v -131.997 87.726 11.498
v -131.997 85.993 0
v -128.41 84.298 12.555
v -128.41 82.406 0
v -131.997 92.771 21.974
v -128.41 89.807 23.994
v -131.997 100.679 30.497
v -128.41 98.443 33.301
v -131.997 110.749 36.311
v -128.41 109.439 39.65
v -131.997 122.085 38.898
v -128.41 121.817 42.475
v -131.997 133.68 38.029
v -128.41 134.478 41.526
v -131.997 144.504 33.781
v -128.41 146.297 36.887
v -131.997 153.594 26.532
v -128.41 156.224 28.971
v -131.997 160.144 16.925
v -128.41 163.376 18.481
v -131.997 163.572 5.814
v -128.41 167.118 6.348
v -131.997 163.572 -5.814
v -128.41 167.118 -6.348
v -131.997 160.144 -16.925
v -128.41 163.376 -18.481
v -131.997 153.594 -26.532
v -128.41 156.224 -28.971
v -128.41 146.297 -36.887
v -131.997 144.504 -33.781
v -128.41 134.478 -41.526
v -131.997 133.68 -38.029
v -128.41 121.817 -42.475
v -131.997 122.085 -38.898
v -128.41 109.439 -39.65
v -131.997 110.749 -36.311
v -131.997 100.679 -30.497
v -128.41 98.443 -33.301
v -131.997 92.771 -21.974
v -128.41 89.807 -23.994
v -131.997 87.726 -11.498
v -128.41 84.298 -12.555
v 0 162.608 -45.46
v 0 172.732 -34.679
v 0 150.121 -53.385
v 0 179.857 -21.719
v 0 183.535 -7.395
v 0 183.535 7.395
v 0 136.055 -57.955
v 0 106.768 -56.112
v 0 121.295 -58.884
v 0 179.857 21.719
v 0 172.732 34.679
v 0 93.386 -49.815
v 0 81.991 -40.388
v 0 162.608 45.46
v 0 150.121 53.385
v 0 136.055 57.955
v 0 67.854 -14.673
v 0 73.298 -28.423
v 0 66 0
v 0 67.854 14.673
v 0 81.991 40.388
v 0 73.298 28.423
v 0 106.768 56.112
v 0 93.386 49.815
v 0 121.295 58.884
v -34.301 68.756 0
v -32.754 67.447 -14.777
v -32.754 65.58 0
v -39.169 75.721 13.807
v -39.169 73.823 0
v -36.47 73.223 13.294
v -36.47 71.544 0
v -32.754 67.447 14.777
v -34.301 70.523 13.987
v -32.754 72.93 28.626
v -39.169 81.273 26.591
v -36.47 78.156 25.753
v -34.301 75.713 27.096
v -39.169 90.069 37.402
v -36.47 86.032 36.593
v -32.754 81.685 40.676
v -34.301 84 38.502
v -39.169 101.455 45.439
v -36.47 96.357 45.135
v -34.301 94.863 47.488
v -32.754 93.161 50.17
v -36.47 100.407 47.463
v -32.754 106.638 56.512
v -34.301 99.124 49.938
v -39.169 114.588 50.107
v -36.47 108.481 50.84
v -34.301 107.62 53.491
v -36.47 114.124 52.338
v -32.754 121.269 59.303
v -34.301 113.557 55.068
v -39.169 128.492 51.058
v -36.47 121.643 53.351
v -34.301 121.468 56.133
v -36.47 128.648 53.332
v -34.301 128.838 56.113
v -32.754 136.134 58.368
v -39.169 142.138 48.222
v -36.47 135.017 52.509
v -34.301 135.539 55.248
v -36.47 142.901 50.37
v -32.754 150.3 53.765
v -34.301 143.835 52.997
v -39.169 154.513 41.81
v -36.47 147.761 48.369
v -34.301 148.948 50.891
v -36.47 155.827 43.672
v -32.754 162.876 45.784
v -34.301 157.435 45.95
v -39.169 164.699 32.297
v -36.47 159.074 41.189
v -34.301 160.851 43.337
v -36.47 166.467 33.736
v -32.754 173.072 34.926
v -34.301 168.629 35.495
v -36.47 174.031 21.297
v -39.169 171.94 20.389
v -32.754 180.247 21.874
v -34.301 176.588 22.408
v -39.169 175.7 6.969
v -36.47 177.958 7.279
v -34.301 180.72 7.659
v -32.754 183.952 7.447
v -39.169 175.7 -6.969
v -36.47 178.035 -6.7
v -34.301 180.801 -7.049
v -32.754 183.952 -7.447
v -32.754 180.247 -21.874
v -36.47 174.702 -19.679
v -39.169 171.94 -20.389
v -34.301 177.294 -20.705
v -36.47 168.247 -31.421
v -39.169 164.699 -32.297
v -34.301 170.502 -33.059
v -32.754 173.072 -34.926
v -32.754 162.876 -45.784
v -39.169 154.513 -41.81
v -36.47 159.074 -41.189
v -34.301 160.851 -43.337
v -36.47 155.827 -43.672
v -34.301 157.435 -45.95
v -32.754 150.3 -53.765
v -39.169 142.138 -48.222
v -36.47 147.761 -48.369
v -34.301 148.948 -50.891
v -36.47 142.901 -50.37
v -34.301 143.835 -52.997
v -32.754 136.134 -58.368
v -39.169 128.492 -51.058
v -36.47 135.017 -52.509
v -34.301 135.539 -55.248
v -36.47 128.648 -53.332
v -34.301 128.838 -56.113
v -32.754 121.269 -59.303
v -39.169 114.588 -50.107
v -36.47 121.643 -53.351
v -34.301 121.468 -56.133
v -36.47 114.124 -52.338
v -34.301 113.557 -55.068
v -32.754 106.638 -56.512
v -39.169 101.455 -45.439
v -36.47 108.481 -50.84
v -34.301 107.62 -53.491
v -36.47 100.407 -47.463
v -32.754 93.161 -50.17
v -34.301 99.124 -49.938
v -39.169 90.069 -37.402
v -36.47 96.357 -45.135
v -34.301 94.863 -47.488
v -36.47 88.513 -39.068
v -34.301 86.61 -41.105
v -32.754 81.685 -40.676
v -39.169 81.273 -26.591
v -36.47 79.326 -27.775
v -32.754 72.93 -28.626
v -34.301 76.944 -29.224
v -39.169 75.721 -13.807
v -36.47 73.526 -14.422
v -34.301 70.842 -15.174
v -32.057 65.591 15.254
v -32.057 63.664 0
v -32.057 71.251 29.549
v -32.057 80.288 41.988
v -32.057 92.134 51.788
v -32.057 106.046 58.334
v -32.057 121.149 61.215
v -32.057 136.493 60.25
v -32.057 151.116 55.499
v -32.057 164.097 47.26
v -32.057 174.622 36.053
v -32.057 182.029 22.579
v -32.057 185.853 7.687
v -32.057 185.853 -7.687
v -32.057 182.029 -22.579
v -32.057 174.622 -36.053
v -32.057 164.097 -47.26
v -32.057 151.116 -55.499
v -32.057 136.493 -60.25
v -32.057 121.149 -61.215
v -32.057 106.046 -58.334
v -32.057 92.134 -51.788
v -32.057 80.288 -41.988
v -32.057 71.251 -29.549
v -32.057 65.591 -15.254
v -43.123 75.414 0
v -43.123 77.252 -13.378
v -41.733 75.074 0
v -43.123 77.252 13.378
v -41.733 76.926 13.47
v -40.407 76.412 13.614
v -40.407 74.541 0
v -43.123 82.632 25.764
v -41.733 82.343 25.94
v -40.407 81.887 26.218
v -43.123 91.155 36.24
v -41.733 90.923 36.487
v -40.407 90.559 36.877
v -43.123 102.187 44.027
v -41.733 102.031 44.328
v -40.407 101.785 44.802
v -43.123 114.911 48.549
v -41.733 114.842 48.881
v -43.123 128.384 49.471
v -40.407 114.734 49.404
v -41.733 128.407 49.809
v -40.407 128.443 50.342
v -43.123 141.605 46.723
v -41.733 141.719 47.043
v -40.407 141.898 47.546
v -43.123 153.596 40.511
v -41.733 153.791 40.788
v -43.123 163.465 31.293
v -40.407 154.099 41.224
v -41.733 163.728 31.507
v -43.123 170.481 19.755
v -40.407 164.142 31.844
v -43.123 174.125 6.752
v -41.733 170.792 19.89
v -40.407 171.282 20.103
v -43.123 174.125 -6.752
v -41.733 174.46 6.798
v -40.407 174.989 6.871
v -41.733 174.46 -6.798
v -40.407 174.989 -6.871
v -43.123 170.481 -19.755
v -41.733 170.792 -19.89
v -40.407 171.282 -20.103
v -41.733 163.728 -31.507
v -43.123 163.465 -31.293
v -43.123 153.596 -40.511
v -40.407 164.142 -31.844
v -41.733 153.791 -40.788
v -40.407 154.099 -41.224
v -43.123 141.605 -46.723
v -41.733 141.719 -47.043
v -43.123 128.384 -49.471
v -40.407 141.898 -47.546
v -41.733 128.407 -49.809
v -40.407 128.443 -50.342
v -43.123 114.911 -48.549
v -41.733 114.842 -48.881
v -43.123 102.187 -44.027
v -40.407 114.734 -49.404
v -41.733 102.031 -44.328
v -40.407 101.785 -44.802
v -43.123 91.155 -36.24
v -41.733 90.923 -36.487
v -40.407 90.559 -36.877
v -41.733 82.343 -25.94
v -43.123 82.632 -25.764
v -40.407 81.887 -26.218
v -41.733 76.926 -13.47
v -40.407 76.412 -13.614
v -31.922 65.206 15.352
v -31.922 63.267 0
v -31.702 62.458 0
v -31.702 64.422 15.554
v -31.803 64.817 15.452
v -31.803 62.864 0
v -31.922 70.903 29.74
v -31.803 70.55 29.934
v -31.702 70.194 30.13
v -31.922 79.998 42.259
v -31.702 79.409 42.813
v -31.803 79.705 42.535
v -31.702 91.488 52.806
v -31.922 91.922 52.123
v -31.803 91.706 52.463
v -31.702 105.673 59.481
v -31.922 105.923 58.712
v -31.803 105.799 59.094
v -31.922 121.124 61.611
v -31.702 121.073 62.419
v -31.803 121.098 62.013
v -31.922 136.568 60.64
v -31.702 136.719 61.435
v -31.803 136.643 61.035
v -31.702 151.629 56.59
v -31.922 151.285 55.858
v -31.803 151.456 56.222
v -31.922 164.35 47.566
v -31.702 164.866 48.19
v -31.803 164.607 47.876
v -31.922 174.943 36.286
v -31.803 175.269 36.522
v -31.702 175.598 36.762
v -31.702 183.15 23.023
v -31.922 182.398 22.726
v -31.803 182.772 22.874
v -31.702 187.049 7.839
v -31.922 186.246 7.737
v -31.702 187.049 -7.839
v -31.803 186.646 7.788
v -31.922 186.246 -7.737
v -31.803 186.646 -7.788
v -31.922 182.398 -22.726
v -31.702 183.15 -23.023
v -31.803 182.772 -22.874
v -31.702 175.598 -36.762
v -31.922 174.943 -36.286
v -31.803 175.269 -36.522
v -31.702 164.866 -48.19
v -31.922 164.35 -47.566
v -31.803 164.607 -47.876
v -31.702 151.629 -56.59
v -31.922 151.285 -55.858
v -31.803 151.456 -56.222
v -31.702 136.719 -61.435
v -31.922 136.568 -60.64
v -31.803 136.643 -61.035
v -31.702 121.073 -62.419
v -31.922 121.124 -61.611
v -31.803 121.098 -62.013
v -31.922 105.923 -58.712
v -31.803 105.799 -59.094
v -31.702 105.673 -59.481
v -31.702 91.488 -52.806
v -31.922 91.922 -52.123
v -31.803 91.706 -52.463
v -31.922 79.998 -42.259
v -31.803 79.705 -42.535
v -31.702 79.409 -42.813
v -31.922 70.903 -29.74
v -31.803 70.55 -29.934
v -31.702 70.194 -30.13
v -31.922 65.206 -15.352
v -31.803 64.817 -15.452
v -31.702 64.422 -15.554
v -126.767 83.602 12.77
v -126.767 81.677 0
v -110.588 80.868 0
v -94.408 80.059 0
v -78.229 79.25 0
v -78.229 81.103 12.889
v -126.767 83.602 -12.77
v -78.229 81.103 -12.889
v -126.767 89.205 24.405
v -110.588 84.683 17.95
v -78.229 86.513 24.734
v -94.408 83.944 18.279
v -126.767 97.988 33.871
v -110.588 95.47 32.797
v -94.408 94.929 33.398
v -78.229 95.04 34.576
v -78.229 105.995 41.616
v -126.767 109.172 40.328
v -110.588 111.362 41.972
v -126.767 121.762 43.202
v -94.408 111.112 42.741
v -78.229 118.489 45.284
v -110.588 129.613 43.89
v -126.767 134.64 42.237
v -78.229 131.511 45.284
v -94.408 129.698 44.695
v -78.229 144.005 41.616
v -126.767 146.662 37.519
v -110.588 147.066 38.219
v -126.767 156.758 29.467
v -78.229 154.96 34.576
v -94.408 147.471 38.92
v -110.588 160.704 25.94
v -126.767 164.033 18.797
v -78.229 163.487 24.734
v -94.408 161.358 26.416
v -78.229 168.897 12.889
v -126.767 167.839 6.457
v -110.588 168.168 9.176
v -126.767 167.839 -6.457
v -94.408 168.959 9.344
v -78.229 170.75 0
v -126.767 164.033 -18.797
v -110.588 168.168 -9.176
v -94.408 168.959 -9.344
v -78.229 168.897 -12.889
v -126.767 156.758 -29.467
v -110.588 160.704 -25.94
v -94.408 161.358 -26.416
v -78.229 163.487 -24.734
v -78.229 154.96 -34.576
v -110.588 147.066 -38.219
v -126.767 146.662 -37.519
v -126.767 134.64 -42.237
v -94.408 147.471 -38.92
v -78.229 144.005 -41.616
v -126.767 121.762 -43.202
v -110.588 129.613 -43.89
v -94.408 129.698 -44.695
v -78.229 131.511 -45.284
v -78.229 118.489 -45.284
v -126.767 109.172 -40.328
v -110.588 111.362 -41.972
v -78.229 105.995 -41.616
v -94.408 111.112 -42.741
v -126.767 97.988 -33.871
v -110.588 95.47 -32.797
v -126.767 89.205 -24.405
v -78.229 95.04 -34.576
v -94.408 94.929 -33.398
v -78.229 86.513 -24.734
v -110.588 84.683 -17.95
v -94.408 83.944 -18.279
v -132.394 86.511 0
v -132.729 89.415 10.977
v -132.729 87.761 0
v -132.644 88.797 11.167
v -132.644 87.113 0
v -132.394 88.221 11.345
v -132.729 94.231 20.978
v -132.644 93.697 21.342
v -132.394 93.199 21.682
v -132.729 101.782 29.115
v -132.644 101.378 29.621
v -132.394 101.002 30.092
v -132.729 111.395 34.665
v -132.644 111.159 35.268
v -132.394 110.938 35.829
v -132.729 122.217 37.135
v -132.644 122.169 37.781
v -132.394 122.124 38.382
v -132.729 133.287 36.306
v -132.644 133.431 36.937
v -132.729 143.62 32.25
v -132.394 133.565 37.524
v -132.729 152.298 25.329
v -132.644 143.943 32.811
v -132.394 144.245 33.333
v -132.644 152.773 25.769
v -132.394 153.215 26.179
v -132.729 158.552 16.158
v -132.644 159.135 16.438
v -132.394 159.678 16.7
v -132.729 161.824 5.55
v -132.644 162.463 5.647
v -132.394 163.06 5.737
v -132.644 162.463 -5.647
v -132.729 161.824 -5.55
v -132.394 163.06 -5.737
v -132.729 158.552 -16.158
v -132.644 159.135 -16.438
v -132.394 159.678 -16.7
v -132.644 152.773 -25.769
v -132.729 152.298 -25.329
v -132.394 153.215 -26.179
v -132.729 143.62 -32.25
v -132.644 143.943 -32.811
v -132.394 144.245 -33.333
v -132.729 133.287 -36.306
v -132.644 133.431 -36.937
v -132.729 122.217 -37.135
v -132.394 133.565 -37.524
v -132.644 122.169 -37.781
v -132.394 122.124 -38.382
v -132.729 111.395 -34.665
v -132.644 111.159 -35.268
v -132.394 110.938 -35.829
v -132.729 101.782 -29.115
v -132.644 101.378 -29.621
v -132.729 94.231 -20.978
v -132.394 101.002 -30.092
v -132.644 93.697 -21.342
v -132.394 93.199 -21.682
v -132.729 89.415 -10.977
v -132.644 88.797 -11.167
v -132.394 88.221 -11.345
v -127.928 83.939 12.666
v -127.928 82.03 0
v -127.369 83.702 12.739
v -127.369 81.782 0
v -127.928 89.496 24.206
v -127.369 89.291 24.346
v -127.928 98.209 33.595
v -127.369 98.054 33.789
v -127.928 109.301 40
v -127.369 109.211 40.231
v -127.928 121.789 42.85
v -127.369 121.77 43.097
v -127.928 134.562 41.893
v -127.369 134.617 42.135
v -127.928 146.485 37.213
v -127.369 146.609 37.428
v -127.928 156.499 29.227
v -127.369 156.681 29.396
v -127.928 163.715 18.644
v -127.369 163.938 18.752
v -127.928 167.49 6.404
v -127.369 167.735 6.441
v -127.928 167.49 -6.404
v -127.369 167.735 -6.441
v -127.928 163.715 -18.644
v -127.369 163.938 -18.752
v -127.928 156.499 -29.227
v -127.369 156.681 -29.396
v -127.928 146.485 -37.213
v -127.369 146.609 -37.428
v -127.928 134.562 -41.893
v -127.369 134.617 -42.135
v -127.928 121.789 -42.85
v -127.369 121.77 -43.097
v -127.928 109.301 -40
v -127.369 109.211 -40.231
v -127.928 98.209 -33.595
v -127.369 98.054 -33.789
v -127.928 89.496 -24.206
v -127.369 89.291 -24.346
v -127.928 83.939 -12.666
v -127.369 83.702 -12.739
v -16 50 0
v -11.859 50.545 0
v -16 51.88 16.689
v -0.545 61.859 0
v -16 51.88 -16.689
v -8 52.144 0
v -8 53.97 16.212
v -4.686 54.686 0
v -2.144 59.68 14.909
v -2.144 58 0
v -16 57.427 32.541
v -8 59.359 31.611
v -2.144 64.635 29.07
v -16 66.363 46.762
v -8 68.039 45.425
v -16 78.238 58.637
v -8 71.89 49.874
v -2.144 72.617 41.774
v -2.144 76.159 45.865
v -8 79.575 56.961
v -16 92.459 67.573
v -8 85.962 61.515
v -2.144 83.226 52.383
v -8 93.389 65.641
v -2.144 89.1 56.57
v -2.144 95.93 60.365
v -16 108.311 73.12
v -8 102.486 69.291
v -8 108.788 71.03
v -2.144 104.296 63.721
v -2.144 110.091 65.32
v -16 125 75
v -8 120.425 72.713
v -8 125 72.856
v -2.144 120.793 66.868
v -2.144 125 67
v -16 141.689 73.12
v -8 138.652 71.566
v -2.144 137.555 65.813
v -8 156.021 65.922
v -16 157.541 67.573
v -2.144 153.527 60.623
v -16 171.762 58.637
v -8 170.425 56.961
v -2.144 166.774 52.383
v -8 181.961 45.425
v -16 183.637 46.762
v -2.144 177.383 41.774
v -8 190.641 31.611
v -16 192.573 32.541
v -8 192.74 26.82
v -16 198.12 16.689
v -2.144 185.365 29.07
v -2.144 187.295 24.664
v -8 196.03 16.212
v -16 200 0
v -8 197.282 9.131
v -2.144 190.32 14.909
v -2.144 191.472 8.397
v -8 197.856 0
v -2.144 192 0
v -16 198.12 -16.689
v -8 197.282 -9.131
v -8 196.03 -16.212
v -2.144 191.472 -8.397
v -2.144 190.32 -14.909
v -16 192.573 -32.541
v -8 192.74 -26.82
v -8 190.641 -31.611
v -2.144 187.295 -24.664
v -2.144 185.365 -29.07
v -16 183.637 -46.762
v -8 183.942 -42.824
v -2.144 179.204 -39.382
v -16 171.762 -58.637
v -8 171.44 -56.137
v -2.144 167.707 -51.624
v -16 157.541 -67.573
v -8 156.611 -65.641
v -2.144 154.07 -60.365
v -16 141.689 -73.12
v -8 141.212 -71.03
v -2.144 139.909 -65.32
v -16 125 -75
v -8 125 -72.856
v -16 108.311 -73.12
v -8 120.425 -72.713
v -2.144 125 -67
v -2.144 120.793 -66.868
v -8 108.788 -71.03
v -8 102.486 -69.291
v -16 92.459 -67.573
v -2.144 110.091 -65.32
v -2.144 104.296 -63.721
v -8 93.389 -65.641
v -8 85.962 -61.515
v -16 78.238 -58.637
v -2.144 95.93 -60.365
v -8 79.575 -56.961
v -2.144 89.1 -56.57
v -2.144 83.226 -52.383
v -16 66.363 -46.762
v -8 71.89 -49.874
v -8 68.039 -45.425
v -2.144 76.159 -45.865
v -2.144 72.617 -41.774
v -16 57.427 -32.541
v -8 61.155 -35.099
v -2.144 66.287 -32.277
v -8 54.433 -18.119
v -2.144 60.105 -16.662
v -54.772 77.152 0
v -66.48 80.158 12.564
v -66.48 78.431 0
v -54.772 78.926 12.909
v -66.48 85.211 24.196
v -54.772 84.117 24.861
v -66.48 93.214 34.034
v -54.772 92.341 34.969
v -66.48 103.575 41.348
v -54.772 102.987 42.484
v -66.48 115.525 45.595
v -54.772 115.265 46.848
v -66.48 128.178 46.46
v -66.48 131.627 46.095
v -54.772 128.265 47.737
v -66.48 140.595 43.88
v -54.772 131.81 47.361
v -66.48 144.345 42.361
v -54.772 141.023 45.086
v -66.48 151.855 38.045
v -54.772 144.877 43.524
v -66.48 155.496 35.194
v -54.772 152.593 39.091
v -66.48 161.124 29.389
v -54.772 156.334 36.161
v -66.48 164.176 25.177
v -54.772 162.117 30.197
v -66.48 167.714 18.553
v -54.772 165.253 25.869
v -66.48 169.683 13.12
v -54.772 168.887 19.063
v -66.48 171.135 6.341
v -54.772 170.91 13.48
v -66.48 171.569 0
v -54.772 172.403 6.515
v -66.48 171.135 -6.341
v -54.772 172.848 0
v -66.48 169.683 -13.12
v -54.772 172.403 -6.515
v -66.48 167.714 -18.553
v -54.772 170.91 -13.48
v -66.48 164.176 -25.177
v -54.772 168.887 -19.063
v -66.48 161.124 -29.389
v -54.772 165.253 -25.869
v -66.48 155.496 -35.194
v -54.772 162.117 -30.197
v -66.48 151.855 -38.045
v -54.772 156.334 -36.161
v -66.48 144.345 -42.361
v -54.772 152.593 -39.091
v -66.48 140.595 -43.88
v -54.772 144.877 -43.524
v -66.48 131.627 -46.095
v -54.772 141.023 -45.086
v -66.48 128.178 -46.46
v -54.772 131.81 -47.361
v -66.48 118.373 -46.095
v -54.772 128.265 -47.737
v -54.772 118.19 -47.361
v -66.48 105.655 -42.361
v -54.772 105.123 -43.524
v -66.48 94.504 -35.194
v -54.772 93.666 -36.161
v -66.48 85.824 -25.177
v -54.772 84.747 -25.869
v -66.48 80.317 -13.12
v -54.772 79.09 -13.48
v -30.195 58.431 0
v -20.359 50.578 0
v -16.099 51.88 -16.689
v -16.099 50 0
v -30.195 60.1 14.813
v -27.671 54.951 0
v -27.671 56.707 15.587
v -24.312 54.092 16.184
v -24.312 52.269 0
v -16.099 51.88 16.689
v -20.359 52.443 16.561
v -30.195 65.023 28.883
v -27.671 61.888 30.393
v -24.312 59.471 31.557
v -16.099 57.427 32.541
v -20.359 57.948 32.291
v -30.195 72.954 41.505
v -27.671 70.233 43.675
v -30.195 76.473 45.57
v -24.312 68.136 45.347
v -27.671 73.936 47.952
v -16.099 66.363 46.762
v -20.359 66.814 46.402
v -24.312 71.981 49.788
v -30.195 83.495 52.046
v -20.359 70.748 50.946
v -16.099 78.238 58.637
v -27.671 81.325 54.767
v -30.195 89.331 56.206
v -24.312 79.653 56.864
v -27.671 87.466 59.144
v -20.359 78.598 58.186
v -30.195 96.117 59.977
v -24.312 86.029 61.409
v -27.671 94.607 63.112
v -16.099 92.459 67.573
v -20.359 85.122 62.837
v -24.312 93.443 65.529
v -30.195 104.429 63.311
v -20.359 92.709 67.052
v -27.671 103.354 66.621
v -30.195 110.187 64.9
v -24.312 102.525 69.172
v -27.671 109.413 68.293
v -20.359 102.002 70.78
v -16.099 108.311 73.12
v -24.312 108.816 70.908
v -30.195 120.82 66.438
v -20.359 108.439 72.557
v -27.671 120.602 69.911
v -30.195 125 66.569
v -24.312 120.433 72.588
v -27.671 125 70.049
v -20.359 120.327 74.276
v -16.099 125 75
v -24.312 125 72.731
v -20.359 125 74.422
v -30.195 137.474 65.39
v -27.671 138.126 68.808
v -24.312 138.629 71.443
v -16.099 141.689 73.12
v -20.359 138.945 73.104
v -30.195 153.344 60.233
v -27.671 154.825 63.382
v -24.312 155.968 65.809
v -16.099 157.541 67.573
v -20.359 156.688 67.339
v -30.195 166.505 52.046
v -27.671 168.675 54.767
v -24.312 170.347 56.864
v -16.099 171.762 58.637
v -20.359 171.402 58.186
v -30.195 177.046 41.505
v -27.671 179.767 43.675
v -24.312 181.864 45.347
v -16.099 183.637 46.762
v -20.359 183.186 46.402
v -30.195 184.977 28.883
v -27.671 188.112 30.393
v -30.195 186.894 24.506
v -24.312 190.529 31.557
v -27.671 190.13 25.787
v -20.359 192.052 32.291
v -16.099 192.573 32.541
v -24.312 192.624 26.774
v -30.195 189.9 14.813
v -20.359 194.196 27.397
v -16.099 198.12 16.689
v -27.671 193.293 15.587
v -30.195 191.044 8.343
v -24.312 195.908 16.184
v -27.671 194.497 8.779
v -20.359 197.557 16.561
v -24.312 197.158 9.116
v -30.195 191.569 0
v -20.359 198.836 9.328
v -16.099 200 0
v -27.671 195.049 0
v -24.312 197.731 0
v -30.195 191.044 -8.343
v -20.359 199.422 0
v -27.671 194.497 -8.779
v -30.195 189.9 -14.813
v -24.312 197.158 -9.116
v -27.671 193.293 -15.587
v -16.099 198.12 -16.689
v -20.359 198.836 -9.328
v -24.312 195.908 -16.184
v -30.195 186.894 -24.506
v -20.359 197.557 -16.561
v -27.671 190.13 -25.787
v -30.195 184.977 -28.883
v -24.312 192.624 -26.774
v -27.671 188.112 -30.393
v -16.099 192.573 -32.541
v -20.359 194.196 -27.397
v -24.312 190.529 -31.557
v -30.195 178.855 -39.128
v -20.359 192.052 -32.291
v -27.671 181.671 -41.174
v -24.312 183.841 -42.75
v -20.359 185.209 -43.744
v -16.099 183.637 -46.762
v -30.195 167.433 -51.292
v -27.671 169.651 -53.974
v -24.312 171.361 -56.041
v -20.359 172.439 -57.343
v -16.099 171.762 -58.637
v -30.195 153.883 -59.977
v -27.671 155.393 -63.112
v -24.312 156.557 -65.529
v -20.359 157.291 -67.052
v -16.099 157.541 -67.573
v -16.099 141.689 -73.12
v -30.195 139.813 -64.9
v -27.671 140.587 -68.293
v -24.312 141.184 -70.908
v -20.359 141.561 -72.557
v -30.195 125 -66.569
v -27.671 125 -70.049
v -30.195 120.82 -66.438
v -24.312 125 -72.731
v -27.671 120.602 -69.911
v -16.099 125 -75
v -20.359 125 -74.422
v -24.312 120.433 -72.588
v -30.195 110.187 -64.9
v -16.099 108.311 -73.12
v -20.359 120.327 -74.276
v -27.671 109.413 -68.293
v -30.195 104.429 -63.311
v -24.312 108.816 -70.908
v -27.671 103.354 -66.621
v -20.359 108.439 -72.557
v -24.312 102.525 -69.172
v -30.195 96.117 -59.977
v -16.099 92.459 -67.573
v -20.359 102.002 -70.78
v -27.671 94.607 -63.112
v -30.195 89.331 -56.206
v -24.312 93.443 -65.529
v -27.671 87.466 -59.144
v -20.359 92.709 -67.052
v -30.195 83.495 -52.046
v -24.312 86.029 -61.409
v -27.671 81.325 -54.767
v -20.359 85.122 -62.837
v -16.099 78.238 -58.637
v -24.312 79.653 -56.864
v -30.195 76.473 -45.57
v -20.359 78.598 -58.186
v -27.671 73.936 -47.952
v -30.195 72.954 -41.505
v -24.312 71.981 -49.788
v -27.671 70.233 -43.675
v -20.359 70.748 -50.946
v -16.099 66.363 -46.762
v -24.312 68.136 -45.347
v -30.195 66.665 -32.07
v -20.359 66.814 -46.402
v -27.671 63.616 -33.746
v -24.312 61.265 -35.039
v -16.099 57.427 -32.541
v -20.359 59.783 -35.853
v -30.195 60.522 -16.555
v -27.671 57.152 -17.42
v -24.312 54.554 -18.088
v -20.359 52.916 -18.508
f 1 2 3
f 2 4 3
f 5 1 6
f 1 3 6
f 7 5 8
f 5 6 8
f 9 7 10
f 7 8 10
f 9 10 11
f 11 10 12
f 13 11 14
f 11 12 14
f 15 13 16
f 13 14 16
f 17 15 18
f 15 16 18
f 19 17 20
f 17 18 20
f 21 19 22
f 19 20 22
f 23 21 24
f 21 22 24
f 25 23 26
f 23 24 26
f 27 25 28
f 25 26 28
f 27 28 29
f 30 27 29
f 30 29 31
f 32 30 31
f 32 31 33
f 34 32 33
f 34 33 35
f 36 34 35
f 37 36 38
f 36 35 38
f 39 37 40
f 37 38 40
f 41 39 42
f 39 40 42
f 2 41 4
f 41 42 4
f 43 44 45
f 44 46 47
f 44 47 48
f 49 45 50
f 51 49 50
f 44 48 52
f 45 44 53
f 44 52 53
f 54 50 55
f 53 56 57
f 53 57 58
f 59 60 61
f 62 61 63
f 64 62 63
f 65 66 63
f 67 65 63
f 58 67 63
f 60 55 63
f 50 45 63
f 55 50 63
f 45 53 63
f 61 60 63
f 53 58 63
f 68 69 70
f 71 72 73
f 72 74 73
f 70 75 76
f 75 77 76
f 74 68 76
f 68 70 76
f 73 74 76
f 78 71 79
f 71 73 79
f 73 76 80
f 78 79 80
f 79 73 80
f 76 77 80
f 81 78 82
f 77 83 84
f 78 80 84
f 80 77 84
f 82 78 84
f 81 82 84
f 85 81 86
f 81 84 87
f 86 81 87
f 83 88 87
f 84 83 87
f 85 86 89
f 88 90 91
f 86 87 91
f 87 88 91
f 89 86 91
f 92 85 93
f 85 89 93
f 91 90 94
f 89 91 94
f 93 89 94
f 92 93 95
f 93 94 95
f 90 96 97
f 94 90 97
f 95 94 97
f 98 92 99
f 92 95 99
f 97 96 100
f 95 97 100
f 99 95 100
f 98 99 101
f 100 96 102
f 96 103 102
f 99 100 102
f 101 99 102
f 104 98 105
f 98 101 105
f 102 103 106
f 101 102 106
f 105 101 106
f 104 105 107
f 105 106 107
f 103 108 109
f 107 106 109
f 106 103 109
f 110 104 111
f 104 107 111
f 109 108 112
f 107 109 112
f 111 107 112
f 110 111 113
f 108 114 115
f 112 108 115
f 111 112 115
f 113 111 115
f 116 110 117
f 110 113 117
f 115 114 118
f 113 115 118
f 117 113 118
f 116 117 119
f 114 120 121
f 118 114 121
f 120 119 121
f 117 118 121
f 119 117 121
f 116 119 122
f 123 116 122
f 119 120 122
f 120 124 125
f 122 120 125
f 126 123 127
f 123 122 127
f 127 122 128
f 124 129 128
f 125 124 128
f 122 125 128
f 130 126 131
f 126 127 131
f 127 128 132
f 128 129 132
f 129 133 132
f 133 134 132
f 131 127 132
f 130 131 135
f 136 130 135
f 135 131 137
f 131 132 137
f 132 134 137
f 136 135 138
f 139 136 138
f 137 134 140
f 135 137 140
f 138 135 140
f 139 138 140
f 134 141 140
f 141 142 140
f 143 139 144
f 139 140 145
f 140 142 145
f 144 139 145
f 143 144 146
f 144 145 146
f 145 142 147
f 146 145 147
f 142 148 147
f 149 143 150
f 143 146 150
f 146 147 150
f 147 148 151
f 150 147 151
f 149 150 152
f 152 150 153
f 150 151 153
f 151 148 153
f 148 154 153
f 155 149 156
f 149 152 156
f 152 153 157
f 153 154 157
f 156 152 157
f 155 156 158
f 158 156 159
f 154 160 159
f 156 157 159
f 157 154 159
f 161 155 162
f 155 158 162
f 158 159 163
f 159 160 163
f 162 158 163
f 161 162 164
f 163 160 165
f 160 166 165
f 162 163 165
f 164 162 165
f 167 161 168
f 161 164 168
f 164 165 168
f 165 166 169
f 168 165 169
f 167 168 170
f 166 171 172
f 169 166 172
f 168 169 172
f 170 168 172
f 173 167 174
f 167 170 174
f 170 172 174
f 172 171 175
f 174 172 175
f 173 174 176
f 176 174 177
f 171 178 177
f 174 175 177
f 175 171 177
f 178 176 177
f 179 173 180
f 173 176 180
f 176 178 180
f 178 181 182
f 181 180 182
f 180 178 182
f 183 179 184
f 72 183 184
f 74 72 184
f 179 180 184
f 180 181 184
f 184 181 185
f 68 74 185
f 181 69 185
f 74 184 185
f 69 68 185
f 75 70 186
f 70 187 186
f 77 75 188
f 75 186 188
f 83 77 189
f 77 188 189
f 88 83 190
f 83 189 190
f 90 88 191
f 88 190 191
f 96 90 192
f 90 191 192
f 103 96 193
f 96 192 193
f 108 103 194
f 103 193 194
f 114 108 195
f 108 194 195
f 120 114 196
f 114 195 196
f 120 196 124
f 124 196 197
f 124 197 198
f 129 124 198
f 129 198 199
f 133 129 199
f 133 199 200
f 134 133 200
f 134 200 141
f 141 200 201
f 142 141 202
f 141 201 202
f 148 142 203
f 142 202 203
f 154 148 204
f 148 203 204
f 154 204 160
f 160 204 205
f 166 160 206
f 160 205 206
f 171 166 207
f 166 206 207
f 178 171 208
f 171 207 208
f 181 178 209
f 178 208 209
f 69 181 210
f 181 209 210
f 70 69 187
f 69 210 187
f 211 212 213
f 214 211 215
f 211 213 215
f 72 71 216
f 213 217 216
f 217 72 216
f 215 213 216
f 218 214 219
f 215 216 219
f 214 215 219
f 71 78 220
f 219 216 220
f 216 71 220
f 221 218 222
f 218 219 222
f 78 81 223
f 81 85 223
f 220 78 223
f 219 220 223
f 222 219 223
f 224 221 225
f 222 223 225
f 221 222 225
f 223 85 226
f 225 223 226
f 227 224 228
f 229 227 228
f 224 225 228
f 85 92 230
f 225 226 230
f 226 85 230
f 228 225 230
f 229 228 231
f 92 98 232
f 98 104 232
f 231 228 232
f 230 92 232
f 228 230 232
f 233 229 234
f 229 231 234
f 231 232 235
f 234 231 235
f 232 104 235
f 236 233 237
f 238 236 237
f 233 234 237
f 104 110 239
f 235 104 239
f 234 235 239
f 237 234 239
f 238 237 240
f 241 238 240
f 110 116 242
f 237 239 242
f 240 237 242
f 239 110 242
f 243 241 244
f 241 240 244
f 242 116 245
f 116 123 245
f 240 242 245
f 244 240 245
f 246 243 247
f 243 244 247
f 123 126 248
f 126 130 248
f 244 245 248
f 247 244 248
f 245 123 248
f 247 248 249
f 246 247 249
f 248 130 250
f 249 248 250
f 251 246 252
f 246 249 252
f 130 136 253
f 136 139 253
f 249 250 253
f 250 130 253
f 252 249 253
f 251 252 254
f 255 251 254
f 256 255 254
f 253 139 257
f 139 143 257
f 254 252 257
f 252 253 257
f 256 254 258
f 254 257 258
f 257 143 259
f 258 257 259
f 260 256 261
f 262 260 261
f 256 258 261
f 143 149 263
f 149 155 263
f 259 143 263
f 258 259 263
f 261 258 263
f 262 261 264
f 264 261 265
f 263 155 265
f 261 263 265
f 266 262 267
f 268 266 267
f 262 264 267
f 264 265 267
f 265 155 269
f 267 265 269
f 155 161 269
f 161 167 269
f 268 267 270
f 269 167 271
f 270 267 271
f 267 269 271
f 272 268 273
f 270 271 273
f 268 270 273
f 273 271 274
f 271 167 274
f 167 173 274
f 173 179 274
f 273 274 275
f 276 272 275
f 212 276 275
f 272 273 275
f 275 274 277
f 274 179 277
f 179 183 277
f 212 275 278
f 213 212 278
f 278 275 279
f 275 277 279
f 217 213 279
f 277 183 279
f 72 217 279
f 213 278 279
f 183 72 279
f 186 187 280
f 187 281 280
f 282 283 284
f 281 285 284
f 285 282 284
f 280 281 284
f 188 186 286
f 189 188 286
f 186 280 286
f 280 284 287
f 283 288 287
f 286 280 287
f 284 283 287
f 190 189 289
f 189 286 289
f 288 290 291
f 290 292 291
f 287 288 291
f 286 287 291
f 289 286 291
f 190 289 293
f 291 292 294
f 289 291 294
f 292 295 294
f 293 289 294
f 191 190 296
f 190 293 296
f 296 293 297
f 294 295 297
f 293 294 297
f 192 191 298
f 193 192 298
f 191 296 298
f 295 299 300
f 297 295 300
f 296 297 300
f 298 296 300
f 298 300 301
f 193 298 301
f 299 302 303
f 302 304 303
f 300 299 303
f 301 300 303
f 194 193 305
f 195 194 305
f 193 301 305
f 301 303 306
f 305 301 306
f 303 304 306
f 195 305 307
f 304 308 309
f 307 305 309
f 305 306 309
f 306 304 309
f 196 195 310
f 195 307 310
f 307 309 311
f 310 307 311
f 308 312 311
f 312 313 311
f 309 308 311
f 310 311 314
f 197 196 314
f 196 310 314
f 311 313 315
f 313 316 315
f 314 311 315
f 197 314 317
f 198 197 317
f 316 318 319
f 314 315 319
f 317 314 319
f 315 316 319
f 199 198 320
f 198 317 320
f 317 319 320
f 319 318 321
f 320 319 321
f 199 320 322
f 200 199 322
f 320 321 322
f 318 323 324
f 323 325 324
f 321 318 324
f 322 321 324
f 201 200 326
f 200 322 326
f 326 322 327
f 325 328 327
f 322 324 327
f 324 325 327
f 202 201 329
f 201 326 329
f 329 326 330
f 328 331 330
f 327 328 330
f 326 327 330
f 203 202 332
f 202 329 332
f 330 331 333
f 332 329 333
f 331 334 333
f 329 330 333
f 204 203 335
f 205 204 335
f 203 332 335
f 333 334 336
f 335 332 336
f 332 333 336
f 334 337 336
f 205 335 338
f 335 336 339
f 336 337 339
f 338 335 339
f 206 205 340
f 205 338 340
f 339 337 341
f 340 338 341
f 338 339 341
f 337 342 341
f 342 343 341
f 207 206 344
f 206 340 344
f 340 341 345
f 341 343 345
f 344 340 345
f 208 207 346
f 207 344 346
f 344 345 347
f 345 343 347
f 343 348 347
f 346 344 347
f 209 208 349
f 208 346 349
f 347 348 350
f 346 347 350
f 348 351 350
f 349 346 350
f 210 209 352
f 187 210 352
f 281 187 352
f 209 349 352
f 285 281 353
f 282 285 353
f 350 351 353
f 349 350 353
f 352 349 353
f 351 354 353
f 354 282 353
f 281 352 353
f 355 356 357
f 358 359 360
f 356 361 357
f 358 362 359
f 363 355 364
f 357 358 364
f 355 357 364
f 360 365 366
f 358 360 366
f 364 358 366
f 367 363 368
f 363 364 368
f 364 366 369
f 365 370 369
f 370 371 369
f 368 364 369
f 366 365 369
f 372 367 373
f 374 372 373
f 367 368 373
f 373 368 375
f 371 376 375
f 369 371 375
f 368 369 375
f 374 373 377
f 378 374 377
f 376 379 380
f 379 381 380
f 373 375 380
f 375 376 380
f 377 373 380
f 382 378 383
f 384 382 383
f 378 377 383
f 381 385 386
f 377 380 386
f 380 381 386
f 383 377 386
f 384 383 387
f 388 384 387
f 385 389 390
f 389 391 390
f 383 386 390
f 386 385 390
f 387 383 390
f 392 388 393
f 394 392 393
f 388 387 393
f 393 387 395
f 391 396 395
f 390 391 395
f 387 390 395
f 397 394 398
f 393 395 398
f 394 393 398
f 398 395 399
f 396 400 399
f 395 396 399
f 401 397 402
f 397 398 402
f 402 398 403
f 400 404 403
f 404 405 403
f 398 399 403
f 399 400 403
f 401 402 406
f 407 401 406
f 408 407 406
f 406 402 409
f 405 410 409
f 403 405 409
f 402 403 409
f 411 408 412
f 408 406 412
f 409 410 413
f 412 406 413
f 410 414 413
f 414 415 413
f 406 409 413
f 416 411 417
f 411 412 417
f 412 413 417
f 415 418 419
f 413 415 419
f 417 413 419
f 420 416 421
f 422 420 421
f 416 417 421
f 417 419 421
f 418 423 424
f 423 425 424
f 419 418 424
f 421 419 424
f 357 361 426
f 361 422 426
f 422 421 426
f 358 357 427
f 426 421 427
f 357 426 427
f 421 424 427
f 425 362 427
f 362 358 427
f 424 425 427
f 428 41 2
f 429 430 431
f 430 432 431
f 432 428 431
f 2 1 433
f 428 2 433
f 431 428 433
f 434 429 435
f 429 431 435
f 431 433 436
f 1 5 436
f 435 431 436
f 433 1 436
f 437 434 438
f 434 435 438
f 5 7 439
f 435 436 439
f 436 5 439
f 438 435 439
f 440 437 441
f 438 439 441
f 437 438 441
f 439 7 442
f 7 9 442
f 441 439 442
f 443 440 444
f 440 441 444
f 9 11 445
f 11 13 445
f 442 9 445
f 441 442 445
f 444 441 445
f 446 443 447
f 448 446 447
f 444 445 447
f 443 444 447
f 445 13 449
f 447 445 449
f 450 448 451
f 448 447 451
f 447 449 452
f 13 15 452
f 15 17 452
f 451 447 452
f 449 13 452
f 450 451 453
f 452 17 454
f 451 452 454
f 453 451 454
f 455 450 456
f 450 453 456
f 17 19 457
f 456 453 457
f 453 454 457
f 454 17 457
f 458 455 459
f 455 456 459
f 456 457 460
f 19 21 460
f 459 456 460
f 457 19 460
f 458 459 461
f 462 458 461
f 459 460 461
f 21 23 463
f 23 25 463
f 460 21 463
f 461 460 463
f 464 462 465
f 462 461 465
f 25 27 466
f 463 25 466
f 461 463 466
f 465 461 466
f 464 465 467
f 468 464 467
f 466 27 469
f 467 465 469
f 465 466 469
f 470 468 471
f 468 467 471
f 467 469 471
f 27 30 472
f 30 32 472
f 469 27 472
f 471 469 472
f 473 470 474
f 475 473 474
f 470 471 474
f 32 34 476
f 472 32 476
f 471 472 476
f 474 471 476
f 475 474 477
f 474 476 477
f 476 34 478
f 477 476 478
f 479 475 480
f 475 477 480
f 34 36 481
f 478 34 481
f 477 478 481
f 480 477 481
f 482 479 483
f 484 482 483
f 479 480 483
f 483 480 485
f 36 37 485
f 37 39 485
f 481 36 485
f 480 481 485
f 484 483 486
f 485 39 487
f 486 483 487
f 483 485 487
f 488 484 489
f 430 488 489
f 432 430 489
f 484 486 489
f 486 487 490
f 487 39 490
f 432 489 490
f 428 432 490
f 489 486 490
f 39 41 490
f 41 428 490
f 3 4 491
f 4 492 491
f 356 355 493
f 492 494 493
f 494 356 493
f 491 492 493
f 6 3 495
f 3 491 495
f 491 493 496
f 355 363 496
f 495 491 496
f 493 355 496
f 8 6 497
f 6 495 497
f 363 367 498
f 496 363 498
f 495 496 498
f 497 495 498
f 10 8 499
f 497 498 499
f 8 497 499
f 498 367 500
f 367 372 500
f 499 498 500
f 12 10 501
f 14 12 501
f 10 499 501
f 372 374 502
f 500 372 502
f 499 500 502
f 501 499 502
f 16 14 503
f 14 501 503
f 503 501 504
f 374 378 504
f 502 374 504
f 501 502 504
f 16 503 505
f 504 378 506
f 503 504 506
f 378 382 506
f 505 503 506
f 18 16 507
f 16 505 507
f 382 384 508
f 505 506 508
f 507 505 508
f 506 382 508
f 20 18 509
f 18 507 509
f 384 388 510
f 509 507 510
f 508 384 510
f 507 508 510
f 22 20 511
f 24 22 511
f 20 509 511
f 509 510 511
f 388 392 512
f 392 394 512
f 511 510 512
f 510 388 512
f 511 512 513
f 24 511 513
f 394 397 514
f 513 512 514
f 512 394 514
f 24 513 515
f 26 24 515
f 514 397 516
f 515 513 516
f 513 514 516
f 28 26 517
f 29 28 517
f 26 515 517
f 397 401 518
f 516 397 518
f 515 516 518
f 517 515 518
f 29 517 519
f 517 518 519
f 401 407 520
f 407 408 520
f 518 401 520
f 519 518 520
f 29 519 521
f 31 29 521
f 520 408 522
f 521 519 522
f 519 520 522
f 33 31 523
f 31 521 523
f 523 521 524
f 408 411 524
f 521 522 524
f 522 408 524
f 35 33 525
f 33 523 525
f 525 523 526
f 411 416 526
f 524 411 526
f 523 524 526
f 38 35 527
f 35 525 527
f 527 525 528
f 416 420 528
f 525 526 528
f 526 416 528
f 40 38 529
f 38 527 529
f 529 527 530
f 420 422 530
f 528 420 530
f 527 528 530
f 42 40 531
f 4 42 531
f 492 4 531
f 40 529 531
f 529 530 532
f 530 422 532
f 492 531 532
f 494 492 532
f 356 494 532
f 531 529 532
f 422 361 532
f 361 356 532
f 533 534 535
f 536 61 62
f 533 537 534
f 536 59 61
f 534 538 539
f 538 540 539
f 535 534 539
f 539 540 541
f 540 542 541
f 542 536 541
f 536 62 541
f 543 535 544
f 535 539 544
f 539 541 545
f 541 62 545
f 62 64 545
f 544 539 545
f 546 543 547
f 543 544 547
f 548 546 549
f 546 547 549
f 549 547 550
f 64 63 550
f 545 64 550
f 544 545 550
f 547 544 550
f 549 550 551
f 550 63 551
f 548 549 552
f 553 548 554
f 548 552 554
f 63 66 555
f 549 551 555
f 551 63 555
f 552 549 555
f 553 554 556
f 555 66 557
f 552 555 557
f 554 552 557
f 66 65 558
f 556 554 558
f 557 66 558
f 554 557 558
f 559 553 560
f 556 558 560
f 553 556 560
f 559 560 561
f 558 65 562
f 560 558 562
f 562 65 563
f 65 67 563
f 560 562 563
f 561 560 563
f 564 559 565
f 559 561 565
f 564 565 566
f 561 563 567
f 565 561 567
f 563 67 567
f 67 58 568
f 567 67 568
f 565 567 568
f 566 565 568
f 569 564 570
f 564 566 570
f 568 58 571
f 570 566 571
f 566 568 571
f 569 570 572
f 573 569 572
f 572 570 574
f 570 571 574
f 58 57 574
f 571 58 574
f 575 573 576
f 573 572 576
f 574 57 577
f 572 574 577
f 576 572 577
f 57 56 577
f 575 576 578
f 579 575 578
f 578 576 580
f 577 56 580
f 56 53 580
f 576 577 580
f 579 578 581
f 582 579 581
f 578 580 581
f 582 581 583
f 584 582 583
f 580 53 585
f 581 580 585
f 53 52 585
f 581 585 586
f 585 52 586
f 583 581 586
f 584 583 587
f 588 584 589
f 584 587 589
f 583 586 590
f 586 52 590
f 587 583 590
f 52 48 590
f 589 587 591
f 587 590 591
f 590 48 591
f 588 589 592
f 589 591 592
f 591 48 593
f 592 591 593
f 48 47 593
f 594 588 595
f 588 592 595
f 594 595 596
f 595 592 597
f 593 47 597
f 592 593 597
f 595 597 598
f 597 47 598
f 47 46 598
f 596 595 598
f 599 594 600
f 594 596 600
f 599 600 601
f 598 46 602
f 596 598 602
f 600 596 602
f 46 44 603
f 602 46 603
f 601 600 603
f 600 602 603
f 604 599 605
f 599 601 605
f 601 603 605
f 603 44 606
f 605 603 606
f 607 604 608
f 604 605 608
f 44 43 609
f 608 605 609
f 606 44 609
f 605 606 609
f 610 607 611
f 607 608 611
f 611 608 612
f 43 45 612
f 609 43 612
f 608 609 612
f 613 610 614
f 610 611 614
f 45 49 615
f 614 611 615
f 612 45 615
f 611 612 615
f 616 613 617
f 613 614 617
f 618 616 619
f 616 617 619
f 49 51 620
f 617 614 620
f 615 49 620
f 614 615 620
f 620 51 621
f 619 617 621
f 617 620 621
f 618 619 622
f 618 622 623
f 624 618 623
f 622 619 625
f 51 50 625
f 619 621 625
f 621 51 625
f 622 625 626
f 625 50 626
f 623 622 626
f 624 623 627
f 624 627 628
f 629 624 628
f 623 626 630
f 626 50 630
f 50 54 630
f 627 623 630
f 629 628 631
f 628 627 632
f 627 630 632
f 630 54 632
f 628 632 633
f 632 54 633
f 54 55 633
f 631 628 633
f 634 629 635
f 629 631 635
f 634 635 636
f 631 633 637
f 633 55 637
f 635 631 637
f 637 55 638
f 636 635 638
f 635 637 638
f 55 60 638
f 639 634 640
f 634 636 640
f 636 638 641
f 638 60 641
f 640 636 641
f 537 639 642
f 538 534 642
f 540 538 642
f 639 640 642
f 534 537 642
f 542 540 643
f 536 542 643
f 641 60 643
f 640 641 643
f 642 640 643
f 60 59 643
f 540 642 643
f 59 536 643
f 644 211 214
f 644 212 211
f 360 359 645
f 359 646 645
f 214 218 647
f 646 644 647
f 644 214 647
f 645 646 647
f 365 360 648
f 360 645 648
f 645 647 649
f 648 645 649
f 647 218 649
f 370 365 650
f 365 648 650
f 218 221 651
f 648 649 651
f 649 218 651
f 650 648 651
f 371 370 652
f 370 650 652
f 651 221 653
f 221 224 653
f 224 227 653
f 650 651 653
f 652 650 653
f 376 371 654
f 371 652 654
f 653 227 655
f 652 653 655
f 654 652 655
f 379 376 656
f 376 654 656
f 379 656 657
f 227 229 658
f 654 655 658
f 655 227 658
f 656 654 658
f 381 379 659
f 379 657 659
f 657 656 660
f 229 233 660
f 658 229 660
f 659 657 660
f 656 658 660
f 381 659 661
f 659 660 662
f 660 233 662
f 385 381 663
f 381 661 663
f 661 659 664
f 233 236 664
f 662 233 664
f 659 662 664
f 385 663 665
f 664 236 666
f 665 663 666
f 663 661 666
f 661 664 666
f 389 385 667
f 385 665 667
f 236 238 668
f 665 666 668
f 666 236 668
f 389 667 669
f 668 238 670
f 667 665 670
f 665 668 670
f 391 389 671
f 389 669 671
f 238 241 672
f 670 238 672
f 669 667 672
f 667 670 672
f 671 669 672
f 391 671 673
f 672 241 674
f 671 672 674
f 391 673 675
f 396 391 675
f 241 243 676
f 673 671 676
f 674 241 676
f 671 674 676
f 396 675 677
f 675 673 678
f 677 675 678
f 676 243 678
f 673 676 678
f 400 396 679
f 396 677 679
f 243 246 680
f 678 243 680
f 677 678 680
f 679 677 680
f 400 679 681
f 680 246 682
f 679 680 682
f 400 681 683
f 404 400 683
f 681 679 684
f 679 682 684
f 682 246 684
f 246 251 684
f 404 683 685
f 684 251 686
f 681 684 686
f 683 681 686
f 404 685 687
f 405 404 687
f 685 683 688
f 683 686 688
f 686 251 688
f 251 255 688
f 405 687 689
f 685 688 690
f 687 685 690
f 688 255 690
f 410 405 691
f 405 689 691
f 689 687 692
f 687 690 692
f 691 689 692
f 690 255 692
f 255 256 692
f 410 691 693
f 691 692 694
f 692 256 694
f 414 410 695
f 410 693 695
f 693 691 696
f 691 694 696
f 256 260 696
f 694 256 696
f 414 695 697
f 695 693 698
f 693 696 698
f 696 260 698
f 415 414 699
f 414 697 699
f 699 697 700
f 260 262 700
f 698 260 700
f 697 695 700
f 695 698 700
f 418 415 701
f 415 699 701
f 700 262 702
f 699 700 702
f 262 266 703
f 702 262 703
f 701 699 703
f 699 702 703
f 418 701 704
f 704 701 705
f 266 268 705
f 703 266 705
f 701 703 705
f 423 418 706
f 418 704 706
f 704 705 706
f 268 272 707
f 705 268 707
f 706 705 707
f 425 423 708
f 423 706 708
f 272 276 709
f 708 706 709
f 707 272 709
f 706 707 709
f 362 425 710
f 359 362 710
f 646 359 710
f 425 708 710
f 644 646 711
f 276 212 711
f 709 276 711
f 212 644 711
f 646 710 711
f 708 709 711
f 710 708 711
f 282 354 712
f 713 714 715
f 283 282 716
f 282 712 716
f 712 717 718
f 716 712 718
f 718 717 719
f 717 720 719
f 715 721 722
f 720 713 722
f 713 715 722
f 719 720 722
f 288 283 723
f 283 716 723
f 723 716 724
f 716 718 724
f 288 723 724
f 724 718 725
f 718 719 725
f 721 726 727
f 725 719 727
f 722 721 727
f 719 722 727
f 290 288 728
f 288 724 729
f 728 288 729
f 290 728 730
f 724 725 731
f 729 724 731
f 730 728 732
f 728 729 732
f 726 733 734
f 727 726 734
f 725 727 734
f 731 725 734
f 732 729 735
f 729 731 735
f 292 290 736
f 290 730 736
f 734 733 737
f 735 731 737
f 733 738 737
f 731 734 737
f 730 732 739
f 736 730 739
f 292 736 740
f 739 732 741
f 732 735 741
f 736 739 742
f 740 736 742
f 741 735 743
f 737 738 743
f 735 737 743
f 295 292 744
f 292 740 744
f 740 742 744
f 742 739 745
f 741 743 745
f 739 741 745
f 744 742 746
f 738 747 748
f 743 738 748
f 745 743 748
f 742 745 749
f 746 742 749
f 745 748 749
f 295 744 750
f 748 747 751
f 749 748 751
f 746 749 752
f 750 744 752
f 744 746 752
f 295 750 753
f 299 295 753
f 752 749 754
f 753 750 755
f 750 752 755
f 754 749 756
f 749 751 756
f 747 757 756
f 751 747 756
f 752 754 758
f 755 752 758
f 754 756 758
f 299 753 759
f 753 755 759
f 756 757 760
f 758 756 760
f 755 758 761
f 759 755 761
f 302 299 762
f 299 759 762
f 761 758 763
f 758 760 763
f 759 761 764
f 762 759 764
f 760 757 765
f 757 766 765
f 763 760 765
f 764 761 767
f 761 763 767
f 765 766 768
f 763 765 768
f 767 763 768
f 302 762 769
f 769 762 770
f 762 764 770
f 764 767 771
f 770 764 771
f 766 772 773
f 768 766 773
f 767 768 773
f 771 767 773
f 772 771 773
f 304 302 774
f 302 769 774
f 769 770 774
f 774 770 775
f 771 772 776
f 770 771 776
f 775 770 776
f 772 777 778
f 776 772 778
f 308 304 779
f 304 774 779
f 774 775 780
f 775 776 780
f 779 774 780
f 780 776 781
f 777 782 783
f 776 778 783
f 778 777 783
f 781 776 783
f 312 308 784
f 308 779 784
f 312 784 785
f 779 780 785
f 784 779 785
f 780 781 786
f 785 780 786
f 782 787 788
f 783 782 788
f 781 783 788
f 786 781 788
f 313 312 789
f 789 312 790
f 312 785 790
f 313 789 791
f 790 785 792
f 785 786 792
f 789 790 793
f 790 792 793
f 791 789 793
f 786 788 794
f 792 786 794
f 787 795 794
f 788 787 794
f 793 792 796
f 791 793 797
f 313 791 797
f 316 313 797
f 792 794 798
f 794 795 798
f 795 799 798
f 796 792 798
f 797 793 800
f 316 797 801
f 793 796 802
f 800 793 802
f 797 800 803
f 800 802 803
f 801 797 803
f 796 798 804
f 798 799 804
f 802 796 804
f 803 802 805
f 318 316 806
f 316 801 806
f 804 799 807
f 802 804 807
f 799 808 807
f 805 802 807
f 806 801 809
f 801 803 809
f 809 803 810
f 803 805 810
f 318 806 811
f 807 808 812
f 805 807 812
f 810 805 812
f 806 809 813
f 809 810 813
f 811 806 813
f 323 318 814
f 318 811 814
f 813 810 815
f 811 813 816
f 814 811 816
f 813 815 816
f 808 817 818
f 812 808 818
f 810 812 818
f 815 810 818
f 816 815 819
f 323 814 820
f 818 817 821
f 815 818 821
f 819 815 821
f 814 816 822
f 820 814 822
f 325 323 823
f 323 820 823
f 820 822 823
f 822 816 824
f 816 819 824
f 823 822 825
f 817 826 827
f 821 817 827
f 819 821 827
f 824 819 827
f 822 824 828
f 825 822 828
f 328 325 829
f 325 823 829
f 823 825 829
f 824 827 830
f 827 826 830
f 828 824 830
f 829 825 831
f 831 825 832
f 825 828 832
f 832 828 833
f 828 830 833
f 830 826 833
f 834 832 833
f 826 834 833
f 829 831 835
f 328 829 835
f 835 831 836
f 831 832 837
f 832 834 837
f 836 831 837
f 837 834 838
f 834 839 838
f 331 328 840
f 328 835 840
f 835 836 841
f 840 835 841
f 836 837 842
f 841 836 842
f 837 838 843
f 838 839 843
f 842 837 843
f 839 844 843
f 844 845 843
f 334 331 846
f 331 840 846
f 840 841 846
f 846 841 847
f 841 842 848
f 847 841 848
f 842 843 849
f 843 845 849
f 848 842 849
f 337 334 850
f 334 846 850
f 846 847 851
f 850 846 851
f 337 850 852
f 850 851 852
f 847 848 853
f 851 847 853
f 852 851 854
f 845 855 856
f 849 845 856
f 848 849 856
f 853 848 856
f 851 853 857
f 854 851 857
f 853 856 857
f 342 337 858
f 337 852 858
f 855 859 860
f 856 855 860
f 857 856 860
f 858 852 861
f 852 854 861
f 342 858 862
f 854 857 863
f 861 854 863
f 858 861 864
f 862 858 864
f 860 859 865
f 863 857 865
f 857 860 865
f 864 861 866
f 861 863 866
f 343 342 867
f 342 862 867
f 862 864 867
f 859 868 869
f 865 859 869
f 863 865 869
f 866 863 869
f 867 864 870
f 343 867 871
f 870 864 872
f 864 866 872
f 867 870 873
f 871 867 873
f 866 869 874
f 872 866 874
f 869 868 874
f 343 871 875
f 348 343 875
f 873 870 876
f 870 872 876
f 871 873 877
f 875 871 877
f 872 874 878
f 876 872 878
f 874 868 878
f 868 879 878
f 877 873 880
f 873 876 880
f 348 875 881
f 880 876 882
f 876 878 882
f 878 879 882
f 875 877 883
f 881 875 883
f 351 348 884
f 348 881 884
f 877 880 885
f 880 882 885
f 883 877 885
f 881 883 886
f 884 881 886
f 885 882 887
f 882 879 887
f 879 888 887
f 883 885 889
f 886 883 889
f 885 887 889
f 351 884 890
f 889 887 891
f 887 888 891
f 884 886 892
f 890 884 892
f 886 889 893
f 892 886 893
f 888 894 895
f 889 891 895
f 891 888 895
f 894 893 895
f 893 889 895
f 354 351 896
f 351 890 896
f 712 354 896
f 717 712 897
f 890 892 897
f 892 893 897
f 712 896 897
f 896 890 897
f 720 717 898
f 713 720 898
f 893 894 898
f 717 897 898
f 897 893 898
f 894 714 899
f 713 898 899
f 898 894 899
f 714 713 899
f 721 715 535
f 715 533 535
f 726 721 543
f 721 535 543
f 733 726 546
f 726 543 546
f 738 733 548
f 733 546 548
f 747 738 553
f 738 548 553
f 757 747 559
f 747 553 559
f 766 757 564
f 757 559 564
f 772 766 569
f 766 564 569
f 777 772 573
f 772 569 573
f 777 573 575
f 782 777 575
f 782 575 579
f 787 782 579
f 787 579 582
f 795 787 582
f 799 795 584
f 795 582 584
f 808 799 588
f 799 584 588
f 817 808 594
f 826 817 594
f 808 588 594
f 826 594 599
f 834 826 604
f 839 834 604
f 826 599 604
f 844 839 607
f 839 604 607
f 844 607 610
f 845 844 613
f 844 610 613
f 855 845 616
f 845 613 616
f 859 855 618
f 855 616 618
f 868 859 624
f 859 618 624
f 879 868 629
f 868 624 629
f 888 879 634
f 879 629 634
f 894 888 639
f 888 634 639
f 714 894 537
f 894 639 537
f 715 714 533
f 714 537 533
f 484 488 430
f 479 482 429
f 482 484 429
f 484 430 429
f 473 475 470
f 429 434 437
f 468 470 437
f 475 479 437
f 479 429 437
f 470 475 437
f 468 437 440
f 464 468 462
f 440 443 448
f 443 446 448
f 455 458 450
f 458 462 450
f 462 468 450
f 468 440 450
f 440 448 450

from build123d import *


with BuildPart() as part:
    # Sketch2 → Revolve1 (revolve)
    with BuildSketch(Plane.XY):
        with BuildLine():
            Line((-126.767029403, 81.676904789), (-78.228933631, 79.25))
            ThreePointArc((-78.228933631, 79.25), (-60.619483805, 77.84878425), (-43.123035518, 75.413537626))
            ThreePointArc((-43.123035518, 75.413537626), (-41.060447751, 74.831340884), (-39.169286378, 73.823010577))
            ThreePointArc((-39.169286378, 73.823010577), (-35.312933401, 70.206346657), (-32.754159078, 65.579858771))
            Line((-32.754159078, 65.579858771), (-32.056761325, 63.663774193))
            ThreePointArc((-32.056761325, 63.663774193), (-31.860334358, 63.066262055), (-31.701859109, 62.457583237))
            ThreePointArc((-31.701859109, 62.457583237), (-26.081952508, 53.496427146), (-16.098933631, 50))
            Line((-16.098933631, 50), (-16, 50))
            ThreePointArc((-16, 50), (-4.686291501, 54.686291501), (0, 66))
            Line((0, 66), (0, 78.5))
            Line((0, 78.5), (0, 125))
            Line((0, 125), (-132.728933631, 125))
            Line((-132.728933631, 125), (-132.728933631, 97.760533906))
            Line((-132.728933631, 97.760533906), (-132.728933631, 87.760533906))
            ThreePointArc((-132.728933631, 87.760533906), (-132.538632462, 86.803825325), (-131.996700584, 85.992766953))
            Line((-131.996700584, 85.992766953), (-128.409952314, 82.406018683))
            ThreePointArc((-128.409952314, 82.406018683), (-127.656283908, 81.888702675), (-126.767029403, 81.676904789))
        make_face()
    revolve(axis=Axis((0, 125, 0), (-1, 0, 0)))


solid = part.part
